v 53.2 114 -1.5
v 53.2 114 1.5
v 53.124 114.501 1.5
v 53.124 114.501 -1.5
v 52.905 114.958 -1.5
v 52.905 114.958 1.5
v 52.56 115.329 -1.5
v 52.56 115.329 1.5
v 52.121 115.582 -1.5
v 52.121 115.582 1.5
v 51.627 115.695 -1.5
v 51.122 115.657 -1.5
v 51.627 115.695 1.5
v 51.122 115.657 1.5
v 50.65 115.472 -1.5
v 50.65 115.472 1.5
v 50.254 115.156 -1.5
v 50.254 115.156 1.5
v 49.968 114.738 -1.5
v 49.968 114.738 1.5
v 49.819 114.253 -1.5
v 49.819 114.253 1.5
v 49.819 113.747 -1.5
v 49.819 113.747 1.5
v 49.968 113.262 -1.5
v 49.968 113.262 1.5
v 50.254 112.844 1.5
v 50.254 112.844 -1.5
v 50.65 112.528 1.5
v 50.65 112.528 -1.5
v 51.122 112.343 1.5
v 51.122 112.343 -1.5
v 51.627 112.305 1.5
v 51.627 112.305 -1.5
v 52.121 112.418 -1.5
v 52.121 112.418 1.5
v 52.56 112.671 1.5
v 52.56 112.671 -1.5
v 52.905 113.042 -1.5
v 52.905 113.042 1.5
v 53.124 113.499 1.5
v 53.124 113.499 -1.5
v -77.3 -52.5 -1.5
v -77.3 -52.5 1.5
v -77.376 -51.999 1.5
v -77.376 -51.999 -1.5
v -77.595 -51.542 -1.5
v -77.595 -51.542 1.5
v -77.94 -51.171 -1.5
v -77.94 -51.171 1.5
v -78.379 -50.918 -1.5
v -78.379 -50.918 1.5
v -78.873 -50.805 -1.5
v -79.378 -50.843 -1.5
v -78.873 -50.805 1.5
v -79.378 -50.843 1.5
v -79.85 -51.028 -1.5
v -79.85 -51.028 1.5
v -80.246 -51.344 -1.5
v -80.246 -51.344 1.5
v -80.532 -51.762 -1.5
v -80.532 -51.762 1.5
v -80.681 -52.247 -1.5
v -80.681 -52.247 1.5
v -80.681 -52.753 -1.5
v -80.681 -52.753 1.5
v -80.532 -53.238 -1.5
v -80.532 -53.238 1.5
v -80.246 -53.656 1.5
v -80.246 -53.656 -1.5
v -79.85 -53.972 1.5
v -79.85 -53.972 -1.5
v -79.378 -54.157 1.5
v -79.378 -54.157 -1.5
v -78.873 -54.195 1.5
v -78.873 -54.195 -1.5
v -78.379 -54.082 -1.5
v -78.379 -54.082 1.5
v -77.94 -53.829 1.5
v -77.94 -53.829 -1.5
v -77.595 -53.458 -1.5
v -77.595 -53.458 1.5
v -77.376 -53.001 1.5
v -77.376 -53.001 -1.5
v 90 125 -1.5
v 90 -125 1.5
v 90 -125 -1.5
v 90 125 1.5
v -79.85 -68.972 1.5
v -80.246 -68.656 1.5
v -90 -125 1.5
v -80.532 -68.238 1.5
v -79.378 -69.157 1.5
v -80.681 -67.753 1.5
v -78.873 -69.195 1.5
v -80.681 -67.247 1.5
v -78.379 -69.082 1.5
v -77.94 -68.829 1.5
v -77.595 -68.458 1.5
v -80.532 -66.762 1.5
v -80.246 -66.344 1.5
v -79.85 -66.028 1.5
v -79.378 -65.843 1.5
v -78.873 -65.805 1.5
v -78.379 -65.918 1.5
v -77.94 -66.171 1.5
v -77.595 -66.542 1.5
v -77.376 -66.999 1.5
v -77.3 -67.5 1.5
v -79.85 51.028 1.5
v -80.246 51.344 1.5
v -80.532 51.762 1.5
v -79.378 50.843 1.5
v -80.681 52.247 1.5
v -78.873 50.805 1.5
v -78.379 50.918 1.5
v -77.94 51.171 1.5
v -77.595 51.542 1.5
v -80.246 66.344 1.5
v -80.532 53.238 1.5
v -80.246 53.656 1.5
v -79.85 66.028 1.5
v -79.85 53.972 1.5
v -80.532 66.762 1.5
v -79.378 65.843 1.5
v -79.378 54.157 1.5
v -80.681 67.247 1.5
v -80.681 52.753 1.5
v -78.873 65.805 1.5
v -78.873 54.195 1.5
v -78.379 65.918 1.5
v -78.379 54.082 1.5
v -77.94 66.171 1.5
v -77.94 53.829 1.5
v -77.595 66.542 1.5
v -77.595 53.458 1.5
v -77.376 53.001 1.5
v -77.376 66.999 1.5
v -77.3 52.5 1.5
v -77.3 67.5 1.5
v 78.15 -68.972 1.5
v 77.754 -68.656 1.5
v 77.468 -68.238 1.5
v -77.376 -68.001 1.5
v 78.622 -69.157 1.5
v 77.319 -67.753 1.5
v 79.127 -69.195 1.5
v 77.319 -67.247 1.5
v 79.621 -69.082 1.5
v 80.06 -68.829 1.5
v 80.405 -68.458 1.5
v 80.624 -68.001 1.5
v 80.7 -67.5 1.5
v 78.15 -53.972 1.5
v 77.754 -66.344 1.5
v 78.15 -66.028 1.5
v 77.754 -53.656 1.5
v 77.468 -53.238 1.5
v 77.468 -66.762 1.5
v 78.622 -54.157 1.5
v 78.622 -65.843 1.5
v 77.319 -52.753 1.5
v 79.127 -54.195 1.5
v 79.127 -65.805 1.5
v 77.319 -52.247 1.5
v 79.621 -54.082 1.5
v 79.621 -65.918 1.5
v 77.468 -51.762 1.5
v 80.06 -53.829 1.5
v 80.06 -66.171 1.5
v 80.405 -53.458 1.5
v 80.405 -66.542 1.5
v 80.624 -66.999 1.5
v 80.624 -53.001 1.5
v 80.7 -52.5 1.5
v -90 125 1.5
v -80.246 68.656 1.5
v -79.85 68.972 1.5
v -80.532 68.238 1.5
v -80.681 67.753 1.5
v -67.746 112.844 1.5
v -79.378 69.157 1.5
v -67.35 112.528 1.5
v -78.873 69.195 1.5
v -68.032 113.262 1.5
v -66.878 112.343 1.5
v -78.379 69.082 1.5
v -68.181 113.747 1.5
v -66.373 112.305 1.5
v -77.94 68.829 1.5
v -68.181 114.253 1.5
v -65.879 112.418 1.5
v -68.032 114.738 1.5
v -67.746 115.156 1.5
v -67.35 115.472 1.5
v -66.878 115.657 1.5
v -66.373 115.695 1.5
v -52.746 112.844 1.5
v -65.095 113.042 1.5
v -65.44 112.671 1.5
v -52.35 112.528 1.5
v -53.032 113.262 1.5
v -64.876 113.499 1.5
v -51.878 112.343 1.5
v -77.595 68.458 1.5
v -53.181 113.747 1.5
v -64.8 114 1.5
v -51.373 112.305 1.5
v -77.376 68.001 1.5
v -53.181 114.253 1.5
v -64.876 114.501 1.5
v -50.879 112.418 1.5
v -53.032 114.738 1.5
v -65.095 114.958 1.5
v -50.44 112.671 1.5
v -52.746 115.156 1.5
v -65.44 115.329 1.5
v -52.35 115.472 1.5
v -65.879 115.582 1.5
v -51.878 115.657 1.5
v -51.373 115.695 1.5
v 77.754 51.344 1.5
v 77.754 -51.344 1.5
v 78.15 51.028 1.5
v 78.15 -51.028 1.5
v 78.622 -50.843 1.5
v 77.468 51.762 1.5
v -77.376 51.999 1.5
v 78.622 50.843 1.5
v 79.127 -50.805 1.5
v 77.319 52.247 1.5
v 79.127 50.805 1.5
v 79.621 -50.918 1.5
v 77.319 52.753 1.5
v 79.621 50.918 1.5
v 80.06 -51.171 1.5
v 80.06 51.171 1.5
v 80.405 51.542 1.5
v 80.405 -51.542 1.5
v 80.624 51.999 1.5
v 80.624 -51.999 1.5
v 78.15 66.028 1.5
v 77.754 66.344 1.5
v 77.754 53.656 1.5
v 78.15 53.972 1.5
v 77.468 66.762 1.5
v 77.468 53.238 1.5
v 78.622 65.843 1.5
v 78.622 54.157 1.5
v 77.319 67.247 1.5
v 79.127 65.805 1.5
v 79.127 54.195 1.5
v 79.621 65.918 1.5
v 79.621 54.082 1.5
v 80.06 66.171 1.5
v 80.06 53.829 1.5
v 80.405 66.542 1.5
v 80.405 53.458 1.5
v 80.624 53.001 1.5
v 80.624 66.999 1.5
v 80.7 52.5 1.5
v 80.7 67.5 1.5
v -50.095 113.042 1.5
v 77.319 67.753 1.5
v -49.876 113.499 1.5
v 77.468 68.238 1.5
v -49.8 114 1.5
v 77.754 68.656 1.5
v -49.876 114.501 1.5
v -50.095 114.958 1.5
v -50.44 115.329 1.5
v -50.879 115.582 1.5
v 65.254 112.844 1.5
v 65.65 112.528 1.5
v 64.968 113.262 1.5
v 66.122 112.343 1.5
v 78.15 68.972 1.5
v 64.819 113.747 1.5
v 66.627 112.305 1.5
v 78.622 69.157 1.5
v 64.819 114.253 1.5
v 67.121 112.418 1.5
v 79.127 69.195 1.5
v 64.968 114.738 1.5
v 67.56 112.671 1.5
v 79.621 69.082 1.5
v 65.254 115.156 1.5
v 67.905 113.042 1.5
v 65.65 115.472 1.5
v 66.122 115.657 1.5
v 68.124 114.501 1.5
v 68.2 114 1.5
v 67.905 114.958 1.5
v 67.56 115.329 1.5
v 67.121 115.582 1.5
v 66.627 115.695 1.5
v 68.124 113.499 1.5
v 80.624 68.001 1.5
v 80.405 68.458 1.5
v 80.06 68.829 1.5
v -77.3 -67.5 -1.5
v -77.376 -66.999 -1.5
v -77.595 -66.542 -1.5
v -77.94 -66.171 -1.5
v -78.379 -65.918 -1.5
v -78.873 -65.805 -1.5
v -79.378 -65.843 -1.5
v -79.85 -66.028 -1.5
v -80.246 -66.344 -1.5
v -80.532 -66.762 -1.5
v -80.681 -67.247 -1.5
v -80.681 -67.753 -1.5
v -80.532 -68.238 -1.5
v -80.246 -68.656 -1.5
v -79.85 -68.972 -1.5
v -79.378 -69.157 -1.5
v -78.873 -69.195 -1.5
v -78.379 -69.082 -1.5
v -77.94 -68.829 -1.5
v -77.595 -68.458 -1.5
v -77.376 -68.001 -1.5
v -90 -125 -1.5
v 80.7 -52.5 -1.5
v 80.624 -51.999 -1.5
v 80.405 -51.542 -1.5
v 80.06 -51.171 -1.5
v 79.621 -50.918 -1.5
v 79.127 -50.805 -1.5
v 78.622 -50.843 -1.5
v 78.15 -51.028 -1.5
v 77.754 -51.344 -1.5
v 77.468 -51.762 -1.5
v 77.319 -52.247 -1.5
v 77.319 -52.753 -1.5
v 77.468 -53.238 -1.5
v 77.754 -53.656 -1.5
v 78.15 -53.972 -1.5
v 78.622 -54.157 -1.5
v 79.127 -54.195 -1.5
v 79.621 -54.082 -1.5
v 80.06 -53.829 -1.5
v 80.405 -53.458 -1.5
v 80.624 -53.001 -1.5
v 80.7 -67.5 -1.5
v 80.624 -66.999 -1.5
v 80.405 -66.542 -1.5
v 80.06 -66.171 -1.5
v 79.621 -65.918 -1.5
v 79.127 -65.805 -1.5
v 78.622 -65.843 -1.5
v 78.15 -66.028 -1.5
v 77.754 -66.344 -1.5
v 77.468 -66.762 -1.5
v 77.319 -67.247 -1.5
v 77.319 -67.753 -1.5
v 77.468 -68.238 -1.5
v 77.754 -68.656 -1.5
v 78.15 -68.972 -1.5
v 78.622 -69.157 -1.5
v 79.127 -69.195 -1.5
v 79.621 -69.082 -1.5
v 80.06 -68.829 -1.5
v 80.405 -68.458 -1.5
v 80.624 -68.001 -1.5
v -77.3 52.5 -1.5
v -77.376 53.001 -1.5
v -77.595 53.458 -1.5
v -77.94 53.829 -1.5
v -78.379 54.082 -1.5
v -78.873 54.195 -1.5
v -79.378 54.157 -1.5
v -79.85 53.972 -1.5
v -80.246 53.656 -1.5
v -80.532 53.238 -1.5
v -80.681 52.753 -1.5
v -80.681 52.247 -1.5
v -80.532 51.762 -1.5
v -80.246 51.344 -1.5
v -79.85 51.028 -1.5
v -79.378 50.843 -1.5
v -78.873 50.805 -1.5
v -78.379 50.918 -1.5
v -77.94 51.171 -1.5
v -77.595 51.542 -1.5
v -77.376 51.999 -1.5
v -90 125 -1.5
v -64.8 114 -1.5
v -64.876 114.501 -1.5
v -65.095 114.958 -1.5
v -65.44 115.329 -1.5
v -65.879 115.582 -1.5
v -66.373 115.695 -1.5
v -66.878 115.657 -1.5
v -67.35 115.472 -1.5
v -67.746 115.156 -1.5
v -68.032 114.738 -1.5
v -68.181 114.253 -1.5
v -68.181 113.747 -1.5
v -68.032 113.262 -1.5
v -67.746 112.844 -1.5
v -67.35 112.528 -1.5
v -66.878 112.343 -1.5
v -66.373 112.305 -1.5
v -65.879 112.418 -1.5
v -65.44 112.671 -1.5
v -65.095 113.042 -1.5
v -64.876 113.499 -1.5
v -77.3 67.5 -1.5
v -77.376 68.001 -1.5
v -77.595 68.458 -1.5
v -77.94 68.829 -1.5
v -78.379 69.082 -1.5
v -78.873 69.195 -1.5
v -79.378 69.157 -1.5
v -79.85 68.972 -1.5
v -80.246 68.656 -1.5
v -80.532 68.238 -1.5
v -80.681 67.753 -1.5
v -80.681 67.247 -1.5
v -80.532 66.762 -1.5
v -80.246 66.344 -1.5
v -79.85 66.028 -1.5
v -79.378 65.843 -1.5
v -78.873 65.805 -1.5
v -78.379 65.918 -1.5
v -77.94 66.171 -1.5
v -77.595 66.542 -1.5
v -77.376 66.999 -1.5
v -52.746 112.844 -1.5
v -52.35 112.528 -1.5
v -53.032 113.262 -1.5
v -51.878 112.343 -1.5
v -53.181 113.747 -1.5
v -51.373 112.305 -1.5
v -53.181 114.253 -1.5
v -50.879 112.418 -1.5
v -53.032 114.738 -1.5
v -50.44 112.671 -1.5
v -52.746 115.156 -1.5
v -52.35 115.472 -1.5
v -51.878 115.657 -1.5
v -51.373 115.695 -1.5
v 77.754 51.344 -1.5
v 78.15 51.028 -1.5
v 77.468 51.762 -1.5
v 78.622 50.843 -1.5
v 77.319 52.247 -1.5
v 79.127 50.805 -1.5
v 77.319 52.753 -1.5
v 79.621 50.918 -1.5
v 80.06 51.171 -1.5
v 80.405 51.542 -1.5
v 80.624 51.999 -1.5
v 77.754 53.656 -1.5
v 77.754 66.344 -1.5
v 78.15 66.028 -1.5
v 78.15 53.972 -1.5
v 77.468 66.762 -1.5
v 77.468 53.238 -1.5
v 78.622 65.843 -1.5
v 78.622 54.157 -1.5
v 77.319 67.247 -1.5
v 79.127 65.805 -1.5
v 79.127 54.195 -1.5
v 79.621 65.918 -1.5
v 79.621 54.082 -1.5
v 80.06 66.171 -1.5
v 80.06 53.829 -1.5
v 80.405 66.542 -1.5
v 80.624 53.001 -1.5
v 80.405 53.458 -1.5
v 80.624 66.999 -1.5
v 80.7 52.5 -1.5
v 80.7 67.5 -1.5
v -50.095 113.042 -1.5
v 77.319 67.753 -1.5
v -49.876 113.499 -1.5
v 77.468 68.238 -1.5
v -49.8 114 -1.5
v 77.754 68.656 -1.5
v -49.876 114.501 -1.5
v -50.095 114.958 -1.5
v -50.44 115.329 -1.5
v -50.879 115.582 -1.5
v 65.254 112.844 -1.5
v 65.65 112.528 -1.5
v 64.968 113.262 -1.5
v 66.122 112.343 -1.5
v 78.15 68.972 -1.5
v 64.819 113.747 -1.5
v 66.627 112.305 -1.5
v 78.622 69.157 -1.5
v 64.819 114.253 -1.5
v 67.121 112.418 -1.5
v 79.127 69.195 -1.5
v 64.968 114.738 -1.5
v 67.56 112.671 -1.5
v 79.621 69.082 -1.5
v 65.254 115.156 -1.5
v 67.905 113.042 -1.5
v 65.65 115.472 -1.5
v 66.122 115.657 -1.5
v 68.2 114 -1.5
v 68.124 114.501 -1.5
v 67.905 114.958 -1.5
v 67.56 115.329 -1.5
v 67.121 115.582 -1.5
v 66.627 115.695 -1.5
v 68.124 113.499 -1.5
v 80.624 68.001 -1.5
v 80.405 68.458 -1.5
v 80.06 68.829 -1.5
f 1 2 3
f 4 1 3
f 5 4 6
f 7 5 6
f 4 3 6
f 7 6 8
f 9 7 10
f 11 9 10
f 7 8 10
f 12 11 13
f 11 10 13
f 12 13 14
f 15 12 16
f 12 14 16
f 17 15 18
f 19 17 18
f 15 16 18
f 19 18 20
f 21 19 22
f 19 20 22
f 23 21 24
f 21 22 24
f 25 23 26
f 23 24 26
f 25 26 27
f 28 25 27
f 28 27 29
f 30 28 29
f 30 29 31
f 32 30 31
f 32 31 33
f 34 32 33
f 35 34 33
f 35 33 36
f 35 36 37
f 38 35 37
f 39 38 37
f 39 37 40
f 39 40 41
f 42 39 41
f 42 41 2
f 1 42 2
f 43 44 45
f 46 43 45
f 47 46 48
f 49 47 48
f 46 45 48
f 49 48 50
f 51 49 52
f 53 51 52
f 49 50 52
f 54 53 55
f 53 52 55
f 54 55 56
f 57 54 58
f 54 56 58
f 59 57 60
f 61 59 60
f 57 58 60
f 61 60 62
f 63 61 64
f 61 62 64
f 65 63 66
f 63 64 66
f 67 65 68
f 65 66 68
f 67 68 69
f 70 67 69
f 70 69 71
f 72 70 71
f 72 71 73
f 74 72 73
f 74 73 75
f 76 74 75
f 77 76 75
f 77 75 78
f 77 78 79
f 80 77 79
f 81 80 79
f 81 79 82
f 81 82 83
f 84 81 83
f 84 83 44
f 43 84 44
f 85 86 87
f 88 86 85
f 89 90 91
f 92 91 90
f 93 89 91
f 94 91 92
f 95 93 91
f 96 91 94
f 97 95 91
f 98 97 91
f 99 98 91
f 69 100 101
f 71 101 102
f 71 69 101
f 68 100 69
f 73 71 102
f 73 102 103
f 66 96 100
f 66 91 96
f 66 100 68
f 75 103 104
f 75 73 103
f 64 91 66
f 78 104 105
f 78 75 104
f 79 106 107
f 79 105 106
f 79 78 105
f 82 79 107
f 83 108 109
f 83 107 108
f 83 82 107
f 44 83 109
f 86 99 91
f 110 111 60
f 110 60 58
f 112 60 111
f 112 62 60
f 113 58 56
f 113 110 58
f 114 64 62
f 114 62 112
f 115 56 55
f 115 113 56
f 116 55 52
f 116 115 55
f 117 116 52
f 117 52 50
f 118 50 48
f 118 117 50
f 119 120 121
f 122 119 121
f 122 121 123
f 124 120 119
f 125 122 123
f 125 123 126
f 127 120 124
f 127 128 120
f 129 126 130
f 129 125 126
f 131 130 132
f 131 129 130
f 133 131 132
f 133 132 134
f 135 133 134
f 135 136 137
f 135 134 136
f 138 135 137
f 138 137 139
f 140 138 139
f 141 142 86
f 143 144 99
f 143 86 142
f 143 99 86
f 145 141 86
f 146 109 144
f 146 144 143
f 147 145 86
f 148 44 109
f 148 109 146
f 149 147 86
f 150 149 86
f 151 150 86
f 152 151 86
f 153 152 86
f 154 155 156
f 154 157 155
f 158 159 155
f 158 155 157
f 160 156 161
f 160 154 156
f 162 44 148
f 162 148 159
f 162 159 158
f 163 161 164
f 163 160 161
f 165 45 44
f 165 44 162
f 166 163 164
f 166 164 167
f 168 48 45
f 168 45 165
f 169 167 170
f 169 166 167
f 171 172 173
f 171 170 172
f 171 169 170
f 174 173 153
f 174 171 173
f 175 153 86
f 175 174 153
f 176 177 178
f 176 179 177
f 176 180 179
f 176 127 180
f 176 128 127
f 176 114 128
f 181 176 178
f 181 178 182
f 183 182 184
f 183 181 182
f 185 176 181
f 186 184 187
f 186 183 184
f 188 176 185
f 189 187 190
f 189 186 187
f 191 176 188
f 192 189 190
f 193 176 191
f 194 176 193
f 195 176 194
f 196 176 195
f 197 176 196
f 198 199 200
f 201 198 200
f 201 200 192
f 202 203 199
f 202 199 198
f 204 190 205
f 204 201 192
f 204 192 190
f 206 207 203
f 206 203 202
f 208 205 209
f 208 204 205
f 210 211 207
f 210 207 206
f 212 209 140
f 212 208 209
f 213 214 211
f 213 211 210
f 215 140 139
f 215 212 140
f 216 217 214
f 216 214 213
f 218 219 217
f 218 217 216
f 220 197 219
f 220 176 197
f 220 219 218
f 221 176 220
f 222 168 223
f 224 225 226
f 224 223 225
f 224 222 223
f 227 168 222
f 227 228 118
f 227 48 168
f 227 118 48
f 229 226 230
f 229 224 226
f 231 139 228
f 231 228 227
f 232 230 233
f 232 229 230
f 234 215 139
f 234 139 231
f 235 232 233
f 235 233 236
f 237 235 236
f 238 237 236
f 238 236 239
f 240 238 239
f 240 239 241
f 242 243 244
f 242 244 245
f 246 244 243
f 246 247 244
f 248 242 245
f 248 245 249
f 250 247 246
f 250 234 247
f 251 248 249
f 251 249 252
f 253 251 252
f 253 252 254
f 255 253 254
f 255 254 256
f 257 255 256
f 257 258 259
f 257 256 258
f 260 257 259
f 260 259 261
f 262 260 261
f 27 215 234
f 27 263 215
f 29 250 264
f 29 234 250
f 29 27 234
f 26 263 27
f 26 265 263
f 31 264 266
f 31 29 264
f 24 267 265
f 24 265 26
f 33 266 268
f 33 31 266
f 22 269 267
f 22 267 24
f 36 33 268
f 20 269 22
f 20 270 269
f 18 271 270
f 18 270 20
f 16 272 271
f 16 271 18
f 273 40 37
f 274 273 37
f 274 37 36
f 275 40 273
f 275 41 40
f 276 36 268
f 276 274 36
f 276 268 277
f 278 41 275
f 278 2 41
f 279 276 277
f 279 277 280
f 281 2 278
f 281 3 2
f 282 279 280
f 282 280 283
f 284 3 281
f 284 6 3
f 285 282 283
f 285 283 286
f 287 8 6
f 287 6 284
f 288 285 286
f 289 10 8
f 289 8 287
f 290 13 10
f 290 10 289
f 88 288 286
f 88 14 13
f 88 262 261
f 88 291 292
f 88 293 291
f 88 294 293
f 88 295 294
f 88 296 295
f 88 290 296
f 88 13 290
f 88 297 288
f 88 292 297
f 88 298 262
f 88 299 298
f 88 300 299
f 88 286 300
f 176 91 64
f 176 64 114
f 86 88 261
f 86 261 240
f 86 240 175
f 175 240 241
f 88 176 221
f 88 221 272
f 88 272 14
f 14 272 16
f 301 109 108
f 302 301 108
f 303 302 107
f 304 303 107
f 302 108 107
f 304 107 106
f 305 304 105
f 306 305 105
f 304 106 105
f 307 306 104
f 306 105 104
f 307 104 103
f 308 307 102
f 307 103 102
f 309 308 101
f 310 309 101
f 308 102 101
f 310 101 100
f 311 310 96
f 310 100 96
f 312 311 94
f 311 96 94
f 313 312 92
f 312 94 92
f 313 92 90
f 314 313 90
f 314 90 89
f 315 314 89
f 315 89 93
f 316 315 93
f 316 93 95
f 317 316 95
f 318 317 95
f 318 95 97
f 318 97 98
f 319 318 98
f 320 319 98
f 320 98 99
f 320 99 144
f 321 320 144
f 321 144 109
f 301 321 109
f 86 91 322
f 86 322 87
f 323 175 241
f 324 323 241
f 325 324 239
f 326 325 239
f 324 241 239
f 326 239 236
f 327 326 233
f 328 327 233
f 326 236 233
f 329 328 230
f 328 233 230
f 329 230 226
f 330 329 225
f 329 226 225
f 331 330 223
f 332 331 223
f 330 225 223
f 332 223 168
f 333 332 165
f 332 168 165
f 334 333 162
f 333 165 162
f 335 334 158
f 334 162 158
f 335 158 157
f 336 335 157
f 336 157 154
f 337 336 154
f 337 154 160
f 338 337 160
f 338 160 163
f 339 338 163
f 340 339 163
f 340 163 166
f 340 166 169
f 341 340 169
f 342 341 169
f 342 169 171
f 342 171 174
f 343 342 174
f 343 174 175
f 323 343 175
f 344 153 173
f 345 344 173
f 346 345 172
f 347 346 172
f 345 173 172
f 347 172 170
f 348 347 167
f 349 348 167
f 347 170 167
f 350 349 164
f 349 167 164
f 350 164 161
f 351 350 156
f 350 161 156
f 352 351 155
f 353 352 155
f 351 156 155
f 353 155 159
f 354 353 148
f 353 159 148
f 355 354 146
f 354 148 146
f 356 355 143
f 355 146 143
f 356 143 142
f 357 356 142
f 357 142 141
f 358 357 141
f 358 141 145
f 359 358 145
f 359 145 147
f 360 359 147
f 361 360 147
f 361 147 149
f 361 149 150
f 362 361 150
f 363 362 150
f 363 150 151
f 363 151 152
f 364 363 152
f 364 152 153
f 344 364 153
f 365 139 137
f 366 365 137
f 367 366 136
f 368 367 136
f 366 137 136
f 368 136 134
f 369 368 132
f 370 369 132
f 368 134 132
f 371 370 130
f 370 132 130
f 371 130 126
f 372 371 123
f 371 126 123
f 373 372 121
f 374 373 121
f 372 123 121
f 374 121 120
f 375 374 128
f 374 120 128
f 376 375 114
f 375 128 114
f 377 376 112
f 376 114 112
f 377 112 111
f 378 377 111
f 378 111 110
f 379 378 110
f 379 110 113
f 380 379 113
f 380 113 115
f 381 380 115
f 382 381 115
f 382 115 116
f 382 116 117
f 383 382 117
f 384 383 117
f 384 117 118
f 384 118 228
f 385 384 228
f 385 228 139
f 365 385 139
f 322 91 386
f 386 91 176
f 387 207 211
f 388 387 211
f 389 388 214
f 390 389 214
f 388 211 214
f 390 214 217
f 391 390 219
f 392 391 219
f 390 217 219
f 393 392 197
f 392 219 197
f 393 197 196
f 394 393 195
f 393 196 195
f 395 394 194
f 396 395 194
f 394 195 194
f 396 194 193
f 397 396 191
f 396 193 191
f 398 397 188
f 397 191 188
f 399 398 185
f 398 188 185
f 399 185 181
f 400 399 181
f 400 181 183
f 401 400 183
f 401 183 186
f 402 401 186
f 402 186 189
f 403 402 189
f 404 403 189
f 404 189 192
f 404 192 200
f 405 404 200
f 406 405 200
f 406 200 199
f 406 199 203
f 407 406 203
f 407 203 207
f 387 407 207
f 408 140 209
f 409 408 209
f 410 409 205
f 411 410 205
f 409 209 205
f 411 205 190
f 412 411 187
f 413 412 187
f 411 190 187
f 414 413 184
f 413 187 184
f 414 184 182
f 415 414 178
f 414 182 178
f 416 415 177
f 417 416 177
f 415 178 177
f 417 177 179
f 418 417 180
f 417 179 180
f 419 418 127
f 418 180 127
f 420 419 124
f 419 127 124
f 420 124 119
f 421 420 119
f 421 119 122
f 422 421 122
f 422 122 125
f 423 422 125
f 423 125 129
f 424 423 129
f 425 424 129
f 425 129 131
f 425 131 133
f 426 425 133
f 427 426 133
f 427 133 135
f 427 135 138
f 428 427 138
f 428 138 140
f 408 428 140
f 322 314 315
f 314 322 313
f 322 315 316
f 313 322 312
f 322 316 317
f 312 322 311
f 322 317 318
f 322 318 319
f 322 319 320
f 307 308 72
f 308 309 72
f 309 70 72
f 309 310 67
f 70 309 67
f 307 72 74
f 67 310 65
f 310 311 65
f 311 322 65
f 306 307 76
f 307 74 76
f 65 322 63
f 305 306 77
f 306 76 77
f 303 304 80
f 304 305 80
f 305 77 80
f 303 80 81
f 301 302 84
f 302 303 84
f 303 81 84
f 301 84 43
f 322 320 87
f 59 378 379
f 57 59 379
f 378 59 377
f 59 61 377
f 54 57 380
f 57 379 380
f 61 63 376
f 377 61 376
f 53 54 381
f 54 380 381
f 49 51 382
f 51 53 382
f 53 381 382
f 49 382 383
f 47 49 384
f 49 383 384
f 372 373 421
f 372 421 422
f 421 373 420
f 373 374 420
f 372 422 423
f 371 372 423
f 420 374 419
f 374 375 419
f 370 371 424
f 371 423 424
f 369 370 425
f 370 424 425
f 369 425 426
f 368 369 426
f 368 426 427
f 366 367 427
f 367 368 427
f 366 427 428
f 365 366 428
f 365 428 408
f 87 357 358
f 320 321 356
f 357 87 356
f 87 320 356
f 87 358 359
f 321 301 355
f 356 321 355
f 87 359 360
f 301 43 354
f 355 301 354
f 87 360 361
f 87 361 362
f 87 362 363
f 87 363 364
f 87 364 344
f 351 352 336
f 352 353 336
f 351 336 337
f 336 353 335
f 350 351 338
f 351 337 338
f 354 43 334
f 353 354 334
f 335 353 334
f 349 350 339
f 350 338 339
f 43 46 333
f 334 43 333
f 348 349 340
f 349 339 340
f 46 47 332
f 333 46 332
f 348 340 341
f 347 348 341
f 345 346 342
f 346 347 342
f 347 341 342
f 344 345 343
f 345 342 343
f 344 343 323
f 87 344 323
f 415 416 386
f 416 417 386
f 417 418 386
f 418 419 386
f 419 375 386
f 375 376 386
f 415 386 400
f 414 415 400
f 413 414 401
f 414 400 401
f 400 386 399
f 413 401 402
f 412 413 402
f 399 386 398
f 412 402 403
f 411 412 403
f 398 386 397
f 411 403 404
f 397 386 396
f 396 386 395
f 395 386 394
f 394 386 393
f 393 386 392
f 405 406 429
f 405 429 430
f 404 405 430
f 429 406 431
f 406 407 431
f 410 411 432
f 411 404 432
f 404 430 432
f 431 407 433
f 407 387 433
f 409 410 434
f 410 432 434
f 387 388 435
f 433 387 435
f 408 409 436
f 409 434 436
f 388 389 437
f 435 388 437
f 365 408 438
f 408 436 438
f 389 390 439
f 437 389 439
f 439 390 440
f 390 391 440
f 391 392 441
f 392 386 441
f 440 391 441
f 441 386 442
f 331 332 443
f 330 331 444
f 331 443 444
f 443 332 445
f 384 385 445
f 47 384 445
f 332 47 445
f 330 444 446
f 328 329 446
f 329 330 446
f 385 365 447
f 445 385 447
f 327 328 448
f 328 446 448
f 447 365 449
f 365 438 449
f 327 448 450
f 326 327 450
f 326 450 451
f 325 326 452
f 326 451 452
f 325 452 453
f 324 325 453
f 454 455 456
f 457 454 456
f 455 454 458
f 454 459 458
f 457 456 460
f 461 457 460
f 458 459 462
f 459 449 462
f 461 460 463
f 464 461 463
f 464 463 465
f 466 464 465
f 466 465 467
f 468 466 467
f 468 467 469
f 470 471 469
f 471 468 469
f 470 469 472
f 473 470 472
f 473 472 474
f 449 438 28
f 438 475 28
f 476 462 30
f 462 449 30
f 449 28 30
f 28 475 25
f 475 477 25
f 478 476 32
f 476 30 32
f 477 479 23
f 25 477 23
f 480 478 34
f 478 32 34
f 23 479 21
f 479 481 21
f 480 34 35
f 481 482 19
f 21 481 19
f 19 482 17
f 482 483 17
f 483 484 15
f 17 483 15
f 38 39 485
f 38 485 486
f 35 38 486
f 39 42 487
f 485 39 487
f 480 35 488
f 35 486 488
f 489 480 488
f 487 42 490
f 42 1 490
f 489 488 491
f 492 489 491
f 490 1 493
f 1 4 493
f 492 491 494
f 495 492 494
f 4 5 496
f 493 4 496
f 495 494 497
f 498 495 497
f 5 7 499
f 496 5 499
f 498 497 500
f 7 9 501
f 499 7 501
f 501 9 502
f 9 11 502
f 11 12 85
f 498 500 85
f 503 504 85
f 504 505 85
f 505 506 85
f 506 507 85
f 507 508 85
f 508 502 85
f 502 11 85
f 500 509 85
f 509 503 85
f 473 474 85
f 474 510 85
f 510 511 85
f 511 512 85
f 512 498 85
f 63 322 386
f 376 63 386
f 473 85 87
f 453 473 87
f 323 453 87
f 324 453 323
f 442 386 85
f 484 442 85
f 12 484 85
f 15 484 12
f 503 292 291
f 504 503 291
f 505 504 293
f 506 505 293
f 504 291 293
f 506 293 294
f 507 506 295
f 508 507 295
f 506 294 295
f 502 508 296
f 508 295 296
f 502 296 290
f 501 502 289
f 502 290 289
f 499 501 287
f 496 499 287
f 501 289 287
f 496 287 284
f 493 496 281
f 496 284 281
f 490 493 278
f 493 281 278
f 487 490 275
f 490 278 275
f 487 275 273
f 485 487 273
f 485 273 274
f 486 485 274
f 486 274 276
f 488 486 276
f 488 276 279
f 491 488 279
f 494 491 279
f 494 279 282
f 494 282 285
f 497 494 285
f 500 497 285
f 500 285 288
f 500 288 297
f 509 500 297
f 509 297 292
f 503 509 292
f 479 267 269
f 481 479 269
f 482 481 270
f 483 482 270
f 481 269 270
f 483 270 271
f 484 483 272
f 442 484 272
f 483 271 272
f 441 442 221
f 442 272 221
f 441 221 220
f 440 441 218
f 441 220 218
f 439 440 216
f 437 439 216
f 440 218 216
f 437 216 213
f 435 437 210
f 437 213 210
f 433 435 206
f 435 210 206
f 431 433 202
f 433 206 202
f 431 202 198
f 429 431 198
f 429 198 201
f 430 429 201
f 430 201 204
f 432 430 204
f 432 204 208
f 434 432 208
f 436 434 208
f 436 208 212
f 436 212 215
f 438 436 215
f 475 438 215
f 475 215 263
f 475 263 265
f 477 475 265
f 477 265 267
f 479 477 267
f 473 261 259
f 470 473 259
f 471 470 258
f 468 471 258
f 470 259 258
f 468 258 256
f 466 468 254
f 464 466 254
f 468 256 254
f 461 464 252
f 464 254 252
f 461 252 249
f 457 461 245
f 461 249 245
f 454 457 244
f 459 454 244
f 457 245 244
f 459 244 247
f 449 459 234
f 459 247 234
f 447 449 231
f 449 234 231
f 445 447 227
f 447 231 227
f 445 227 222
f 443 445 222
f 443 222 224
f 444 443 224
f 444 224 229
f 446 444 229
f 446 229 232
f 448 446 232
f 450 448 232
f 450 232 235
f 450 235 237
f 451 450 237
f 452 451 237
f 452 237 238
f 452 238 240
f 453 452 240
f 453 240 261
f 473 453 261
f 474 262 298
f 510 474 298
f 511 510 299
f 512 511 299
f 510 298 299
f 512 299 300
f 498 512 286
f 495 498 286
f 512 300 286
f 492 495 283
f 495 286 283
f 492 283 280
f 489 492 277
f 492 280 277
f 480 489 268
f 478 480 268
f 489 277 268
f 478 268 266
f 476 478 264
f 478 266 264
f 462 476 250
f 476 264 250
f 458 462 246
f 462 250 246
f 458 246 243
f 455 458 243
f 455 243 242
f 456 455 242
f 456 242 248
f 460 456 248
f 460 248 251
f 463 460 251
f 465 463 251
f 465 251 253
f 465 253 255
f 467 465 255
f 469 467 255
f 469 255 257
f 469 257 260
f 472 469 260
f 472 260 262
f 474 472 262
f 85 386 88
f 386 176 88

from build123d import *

# Parameters (mm, degrees)
ESQUISSE1_W             = 180
ESQUISSE1_H             = 250
BOSS_EXTRU_1_DEPTH      = 1.5
ESQUISSE2_R             = 1.7
ENL_V_MAT_EXTRU_1_DEPTH = 4
ESQUISSE3_R             = 1.7
ENL_V_MAT_EXTRU_2_DEPTH = 4


with BuildPart() as part:
    # Esquisse1 → Boss.-Extru.1 (new body, symmetric)
    with BuildSketch(Plane.XY):
        Rectangle(ESQUISSE1_W, ESQUISSE1_H)
    extrude(amount=BOSS_EXTRU_1_DEPTH, both=True)

    # Esquisse2 → Enlèv. mat.-Extru.1 (cut, through all)
    with BuildSketch(Plane.XY.offset(1.5)):
        with Locations((-51.5, 114)):
            Circle(ESQUISSE2_R)
        with Locations((-66.5, 114)):
            Circle(ESQUISSE2_R)
        with Locations((51.5, 114)):
            Circle(ESQUISSE2_R)
        with Locations((66.5, 114)):
            Circle(ESQUISSE2_R)
    extrude(amount=-ENL_V_MAT_EXTRU_1_DEPTH, mode=Mode.SUBTRACT)

    # Esquisse3 → Enlèv. mat.-Extru.2 (cut, through all)
    with BuildSketch(Plane.XY.offset(1.5)):
        with Locations((-79, 67.5)):
            Circle(ESQUISSE3_R)
        with Locations((-79, 52.5)):
            Circle(ESQUISSE3_R)
        with Locations((-79, -52.5)):
            Circle(ESQUISSE3_R)
        with Locations((-79, -67.5)):
            Circle(ESQUISSE3_R)
        with Locations((79, -67.5)):
            Circle(ESQUISSE3_R)
        with Locations((79, -52.5)):
            Circle(ESQUISSE3_R)
        with Locations((79, 52.5)):
            Circle(ESQUISSE3_R)
        with Locations((79, 67.5)):
            Circle(ESQUISSE3_R)
    extrude(amount=-ENL_V_MAT_EXTRU_2_DEPTH, mode=Mode.SUBTRACT)


solid = part.part
